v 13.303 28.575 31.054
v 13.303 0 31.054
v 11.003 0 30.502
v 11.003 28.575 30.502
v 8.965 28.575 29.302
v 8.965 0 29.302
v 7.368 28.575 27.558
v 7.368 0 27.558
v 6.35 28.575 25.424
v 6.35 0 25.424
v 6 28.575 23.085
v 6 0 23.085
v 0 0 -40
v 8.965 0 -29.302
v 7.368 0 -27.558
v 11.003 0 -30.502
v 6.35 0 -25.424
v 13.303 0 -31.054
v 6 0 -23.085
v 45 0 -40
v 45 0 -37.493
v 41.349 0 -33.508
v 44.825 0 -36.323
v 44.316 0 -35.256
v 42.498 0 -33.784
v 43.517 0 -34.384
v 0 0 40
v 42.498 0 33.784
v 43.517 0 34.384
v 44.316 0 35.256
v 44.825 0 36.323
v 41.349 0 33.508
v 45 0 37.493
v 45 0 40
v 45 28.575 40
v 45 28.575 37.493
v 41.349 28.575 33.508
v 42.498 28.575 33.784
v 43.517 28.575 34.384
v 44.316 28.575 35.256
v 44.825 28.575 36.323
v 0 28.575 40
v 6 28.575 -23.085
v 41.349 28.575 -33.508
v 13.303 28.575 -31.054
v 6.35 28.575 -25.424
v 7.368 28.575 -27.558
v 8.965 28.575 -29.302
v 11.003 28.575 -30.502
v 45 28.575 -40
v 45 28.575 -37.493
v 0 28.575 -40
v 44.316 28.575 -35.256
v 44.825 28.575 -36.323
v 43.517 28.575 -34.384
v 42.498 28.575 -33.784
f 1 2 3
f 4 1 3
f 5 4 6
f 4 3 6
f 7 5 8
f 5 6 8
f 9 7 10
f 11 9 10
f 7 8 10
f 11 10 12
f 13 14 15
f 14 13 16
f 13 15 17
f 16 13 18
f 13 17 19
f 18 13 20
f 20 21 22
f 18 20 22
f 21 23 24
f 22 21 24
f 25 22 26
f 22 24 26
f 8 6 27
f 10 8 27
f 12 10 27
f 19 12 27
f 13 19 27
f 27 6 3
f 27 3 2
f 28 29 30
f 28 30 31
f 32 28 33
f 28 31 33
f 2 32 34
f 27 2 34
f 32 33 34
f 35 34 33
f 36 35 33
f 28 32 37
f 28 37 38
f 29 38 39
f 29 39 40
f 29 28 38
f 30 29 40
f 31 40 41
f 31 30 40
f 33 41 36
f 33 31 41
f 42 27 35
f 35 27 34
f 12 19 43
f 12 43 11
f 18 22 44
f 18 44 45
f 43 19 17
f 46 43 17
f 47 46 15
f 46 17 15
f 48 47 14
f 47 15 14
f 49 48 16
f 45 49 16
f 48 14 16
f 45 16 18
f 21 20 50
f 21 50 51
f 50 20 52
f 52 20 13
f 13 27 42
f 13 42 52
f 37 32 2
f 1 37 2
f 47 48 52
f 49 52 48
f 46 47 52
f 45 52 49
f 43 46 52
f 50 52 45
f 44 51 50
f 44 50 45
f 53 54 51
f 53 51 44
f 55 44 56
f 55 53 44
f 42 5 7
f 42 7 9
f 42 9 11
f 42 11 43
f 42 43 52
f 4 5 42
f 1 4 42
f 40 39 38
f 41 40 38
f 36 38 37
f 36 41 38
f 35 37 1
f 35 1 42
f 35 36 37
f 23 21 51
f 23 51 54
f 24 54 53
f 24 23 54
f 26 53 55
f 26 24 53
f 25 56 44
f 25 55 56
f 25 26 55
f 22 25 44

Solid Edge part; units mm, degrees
sketch "Sketch1" plane through (0, 0, 0) normal (0, -1, 0) x (1, 0, 0)
  line L0 (45, -40) -> (0, -40)
  line L1 (0, 40) -> (0, -40)
  line L2 (0, 40) -> (45, 40)
  line L3 (45, 40) -> (45, 37.4928)
  arc A0 (41.3486, 33.508) -> (45, 37.4928) centre (41, 37.4928) ccw
  line L4 (41.3486, 33.508) -> (13.3028, 31.0543)
  arc A1 (13.3028, 31.0543) -> (6, 23.0847) centre (14, 23.0847) ccw
  line L5 (6, -23.0847) -> (6, 23.0847)
  arc A2 (6, -23.0847) -> (13.3028, -31.0543) centre (14, -23.0847) ccw
  line L6 (41.3486, -33.508) -> (13.3028, -31.0543)
  arc A3 (41.3486, -33.508) -> (45, -37.4928) centre (41, -37.4928) cw
  line L7 (45, -40) -> (45, -37.4928)
  dimension "D1" = 2.5072
  dimension "D2" = 2.5072
  dimension "D3" = 80
  dimension "D4" = 45
  dimension "D5" = 6
extrude "Protrusion1" add sketch "Sketch1" against normal blind 28.575
